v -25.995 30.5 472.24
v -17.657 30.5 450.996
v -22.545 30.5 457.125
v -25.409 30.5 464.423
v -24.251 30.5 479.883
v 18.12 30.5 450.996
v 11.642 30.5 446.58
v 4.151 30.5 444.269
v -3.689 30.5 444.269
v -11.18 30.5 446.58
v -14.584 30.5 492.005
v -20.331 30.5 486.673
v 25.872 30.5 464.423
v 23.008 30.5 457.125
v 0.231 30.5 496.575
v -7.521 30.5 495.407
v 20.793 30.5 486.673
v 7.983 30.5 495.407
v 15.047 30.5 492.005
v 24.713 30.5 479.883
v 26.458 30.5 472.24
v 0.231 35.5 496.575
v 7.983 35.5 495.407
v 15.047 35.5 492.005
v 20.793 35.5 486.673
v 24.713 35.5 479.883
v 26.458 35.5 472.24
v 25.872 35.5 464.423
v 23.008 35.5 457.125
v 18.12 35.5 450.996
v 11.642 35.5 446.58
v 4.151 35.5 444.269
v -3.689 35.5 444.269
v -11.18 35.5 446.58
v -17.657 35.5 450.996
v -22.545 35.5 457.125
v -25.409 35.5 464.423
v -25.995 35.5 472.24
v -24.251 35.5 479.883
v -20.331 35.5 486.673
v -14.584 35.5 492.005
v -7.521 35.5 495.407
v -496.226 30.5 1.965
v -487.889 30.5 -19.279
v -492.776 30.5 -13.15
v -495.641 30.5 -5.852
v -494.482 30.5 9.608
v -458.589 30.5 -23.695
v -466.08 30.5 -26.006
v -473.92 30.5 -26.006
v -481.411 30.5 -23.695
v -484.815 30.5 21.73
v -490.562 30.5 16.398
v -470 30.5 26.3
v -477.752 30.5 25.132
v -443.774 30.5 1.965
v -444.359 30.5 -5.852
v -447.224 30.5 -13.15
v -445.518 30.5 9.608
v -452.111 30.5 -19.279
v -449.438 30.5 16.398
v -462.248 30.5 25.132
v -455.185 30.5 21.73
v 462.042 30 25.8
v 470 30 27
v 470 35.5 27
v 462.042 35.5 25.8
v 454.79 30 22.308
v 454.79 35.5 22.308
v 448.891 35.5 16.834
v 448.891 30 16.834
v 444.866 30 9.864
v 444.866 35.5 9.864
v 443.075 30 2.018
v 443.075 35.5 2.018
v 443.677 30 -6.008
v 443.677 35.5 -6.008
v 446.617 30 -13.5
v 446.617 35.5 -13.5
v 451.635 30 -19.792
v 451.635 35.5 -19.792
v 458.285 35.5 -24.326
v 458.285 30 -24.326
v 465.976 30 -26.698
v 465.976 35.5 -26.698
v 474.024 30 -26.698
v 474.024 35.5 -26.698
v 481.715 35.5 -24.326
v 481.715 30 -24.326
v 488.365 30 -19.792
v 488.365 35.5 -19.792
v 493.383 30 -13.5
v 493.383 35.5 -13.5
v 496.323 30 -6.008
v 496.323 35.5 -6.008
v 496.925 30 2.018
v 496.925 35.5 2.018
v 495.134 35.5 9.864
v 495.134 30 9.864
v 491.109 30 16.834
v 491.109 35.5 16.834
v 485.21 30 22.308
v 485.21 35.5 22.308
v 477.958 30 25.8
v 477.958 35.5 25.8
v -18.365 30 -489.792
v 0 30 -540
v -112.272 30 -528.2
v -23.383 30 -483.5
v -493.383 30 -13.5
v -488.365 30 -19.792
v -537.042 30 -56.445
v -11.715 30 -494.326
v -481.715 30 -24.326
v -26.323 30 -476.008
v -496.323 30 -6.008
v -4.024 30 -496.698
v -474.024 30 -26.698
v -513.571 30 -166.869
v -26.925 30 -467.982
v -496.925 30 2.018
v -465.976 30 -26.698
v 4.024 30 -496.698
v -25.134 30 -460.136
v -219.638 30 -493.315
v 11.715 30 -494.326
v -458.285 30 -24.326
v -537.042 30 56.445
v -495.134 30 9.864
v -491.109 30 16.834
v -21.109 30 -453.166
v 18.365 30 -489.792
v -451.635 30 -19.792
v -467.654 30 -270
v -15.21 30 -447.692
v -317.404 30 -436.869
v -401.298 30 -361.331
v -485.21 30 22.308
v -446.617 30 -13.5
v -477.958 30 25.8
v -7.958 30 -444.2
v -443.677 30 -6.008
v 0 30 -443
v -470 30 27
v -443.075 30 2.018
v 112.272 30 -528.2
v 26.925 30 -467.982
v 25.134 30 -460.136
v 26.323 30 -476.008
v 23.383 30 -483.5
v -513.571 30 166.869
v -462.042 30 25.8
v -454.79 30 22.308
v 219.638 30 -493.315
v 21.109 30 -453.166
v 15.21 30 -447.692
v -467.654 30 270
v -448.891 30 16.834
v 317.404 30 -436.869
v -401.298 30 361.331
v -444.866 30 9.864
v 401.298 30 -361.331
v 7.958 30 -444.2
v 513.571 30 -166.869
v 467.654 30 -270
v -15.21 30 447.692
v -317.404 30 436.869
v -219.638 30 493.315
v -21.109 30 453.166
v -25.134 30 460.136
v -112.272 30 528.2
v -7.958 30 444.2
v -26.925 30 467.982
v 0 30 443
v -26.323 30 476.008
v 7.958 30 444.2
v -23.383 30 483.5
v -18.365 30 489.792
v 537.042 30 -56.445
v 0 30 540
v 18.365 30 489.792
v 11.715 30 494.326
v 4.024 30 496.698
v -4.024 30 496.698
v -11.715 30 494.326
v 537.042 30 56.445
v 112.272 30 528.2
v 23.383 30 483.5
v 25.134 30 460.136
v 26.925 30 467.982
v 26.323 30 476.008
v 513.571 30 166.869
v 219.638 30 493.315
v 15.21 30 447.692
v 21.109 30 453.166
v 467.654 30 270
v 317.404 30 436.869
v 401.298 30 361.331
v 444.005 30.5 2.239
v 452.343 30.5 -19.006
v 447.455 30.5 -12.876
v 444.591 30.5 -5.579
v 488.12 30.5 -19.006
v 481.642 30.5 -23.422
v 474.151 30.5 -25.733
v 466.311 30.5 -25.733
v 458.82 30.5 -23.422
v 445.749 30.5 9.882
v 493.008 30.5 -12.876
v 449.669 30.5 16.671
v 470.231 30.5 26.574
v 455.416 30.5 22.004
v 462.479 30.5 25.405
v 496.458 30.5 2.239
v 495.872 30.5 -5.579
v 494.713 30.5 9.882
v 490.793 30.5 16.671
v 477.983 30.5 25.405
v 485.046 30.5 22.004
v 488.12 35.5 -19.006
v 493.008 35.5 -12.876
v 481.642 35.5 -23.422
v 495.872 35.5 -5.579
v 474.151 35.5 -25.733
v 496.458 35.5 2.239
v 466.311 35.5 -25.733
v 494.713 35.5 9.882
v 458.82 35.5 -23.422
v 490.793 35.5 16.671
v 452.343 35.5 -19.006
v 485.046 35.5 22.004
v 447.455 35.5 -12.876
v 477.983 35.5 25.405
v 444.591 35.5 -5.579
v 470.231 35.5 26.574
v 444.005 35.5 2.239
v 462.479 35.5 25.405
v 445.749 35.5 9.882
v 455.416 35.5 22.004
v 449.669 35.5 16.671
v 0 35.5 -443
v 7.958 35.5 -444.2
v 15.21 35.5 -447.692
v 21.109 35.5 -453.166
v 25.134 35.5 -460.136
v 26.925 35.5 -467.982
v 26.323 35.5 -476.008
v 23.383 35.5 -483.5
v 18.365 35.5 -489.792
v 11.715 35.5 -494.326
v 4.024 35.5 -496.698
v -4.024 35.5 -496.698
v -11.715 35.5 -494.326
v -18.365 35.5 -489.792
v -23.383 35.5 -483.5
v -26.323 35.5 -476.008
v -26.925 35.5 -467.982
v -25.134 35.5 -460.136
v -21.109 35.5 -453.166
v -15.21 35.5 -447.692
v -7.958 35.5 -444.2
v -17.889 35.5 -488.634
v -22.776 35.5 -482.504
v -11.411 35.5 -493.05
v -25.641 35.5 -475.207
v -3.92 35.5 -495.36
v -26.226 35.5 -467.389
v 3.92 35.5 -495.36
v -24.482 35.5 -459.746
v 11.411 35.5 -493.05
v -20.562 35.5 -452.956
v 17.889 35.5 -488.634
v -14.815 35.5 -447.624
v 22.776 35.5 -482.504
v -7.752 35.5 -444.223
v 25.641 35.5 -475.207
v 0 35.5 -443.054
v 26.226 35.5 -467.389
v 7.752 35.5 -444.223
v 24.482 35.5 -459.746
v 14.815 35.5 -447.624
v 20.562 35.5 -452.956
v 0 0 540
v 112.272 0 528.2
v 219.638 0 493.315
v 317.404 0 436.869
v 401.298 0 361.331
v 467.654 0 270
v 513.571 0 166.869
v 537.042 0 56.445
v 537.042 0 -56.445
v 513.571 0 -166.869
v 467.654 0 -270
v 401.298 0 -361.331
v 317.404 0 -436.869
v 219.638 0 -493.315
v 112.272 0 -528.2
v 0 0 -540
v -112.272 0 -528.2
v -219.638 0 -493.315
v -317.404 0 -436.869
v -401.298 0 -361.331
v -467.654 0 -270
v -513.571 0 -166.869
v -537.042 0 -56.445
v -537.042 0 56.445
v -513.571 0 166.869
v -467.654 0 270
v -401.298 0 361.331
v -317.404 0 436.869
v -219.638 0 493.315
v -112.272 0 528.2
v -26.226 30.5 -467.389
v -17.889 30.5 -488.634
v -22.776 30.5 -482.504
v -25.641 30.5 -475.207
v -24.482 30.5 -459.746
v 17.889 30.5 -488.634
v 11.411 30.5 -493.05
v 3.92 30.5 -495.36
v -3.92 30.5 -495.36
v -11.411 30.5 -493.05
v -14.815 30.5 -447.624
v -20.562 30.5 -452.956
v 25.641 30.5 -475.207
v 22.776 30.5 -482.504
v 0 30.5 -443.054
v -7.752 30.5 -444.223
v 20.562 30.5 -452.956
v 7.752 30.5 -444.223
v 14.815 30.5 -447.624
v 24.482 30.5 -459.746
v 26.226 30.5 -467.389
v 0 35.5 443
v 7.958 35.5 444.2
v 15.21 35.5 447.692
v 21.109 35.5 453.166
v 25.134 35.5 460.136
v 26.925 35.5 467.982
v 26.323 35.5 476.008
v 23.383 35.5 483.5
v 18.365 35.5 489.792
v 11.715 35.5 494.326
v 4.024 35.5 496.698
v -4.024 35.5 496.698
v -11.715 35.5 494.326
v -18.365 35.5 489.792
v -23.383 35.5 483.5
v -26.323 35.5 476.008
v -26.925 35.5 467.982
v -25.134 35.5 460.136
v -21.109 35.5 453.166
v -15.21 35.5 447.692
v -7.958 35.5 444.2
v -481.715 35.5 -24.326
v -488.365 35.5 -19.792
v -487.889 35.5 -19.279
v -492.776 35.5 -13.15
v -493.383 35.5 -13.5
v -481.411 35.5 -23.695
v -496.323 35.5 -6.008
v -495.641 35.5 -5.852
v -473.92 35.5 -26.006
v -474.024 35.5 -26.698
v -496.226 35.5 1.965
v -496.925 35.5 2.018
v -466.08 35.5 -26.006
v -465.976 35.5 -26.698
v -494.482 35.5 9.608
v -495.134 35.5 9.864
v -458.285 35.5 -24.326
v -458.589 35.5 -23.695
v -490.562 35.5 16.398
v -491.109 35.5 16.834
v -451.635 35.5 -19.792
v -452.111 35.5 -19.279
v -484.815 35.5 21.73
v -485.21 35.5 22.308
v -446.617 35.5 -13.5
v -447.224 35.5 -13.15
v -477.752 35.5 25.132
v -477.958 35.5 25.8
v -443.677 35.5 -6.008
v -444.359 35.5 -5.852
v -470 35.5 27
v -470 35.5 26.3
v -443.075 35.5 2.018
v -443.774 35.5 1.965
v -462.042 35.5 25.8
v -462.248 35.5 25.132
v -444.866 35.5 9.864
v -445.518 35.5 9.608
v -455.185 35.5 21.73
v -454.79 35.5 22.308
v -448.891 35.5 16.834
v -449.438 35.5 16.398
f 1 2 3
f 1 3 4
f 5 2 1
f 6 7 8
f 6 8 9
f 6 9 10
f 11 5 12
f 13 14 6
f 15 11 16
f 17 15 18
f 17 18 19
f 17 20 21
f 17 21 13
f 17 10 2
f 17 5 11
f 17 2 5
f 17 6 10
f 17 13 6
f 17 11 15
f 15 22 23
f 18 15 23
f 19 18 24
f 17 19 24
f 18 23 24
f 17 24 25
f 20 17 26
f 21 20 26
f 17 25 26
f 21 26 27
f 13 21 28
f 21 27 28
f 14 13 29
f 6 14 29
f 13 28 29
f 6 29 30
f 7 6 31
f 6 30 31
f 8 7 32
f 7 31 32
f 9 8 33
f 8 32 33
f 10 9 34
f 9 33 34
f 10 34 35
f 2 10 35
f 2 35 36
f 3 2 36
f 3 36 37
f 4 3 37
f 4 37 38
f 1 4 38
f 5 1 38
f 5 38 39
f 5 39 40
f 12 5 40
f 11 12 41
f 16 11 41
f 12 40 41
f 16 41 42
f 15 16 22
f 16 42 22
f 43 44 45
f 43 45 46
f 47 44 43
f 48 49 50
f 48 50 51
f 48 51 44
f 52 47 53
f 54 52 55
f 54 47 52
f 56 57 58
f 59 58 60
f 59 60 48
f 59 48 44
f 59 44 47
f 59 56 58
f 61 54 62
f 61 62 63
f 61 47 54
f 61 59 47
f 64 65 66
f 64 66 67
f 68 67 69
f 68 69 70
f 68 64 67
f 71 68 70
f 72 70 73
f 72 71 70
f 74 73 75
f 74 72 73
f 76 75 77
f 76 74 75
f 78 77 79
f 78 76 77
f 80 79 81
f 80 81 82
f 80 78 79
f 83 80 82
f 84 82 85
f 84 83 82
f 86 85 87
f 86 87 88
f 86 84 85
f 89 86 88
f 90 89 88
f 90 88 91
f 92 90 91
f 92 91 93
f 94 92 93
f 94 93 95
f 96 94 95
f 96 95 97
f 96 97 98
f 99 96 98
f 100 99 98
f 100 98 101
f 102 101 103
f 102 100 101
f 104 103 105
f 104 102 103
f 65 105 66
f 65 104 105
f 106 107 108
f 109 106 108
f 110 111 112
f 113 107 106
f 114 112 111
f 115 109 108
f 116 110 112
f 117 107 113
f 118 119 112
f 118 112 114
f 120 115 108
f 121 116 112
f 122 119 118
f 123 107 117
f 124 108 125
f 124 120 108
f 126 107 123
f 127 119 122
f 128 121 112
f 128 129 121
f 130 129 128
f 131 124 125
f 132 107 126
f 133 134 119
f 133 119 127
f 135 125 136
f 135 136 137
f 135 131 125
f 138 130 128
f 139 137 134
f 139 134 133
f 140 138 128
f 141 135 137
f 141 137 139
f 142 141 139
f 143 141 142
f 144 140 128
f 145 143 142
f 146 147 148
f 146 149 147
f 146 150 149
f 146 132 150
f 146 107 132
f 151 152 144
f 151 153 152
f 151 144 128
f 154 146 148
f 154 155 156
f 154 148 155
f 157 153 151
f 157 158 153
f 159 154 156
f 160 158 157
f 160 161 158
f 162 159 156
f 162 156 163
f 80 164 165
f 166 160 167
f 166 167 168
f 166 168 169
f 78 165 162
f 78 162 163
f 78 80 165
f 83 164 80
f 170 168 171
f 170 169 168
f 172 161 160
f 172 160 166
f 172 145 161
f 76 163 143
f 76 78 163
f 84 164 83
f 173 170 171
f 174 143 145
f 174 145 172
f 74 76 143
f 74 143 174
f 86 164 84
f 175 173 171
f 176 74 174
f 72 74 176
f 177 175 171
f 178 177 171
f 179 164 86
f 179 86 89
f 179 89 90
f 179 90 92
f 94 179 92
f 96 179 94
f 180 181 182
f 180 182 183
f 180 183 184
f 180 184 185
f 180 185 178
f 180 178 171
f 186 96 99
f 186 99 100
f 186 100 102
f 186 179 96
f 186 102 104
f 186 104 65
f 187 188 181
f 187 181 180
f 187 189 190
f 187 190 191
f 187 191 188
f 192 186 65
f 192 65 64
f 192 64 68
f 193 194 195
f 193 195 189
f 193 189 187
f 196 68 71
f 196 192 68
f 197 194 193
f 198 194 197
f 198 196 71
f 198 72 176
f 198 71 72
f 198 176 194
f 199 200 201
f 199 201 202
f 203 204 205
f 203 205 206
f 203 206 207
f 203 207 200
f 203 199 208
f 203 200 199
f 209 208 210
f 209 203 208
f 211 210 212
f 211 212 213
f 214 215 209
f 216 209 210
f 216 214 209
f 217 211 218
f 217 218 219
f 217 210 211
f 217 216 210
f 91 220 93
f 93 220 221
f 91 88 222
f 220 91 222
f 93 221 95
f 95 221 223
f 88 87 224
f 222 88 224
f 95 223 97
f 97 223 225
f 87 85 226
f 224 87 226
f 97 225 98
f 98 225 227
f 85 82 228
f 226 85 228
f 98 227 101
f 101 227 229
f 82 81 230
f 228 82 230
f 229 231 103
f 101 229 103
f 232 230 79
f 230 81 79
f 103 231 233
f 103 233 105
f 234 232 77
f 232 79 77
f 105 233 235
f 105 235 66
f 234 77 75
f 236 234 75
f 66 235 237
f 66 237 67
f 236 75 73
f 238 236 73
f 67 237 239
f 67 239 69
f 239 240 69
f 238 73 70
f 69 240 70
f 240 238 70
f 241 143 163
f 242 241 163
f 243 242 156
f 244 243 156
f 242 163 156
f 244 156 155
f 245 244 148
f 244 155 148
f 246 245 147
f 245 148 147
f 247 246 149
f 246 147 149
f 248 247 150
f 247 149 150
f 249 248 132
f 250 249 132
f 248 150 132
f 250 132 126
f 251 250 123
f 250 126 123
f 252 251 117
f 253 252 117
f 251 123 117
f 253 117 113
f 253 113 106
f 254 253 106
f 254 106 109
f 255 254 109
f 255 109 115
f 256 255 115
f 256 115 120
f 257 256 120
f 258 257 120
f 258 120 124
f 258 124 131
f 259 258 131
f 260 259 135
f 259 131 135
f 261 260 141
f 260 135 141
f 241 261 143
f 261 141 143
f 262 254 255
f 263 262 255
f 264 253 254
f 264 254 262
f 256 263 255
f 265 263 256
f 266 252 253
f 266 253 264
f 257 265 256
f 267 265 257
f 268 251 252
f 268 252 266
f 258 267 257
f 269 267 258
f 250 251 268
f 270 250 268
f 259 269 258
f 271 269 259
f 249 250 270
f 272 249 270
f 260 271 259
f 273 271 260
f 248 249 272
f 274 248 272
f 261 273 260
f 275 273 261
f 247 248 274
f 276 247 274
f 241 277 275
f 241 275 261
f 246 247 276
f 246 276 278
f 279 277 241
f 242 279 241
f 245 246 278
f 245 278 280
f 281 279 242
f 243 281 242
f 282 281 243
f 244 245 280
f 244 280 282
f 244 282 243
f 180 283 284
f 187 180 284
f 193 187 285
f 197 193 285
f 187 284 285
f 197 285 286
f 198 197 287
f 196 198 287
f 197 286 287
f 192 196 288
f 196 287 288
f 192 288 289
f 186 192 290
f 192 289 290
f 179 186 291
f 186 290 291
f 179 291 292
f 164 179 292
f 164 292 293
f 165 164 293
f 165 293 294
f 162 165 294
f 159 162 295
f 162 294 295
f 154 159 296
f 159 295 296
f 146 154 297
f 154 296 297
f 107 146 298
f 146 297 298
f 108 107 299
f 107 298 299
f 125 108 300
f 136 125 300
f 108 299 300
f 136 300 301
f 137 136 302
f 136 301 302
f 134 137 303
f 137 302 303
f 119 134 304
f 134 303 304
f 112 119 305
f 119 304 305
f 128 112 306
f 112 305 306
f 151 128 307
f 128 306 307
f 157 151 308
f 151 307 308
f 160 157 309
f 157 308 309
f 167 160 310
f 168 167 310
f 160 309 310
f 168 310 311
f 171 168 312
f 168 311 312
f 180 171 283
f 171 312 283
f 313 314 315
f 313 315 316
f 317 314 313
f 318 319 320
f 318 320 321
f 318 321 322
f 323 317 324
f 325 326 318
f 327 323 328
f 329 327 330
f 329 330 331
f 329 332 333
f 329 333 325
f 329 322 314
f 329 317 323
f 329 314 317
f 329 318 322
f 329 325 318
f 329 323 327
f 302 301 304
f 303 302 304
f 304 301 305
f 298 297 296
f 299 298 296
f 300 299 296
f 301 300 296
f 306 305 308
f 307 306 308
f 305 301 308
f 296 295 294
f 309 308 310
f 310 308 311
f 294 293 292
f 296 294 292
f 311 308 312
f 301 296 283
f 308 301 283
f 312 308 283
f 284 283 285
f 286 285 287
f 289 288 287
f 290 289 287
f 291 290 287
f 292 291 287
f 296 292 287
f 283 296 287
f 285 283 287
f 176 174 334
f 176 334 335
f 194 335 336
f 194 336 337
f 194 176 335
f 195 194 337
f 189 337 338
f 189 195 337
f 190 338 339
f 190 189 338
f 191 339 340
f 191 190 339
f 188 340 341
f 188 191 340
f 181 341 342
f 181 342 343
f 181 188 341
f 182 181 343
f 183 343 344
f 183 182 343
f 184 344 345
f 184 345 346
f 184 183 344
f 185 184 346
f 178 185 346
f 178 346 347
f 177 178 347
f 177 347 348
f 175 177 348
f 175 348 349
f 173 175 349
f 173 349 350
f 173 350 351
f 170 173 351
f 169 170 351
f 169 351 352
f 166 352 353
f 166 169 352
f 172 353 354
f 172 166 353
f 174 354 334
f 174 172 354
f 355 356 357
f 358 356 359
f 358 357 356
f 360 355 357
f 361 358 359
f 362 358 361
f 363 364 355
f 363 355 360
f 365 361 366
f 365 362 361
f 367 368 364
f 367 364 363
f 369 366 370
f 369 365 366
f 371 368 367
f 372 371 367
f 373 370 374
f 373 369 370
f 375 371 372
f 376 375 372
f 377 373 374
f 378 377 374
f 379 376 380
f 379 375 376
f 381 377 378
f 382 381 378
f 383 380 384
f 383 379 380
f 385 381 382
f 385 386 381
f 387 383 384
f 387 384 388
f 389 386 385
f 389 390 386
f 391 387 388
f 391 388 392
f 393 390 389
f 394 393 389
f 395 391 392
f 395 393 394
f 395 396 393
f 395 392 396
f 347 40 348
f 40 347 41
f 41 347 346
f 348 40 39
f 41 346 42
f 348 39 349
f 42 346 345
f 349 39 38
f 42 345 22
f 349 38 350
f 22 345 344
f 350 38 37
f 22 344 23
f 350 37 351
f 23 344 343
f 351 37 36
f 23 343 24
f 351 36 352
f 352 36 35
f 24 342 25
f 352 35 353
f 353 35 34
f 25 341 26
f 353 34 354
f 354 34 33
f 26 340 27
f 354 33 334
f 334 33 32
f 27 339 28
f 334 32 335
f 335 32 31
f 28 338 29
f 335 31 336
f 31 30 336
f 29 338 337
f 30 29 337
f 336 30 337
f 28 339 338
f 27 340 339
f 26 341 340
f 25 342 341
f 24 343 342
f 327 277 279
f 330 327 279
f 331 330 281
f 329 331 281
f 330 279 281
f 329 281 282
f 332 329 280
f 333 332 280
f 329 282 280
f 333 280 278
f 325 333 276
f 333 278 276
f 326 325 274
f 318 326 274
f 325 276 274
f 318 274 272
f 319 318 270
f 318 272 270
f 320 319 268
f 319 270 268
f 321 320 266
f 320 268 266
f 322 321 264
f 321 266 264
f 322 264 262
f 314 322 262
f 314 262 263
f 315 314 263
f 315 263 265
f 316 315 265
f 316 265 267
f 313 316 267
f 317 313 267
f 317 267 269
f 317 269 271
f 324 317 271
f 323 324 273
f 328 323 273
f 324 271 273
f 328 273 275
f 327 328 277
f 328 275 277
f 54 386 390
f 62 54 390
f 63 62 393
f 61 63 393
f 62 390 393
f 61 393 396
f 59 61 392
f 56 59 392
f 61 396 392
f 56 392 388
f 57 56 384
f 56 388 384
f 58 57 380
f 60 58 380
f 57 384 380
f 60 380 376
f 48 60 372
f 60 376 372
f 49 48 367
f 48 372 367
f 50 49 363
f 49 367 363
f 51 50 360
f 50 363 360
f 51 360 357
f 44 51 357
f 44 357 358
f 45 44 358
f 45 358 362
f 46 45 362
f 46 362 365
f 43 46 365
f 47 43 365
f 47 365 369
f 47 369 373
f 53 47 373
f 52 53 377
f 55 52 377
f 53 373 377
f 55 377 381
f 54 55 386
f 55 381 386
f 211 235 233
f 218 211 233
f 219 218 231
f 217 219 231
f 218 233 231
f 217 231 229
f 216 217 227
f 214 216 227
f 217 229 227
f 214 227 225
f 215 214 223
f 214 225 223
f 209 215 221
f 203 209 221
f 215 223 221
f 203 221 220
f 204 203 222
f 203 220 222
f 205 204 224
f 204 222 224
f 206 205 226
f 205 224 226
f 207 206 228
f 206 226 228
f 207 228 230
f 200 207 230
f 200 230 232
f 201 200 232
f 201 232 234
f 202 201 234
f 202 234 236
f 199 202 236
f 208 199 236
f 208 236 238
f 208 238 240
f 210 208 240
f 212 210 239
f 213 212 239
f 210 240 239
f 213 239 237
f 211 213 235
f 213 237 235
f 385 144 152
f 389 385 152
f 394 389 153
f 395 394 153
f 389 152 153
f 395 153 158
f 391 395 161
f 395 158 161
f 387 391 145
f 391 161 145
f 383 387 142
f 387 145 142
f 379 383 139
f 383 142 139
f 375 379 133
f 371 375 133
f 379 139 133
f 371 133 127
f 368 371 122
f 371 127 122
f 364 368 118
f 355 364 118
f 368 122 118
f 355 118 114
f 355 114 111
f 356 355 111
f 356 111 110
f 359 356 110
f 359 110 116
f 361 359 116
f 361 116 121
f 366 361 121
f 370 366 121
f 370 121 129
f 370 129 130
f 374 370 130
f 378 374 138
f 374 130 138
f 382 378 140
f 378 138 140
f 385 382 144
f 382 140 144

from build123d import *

# Parameters (mm, degrees)
SKETCH1_R           = 540
BOSS_EXTRUDE1_DEPTH = 30
SKETCH7_R           = 27
BOSS_EXTRUDE2_DEPTH = 5.5
SKETCH10_R          = 26.3
CUT_EXTRUDE1_DEPTH  = 5
SKETCH11_R          = 27
BOSS_EXTRUDE3_DEPTH = 5.5
SKETCH12_R          = 26.3
CUT_EXTRUDE2_DEPTH  = 5
SKETCH13_R          = 26.3
CUT_EXTRUDE3_DEPTH  = 5
SKETCH14_R          = 26.3
CUT_EXTRUDE4_DEPTH  = 5


with BuildPart() as part:
    # Sketch1 → Boss-Extrude1 (new body)
    with BuildSketch(Plane(origin=(0, 0, 0), x_dir=(1, 0, 0), z_dir=(0, 1, 0))):
        with Locations(Location((0, 0, 0), (0, 0, 270))):
            Circle(SKETCH1_R)
    extrude(amount=BOSS_EXTRUDE1_DEPTH)

    # Sketch7 → Boss-Extrude2 (add)
    with BuildSketch(Plane(origin=(0, 30, 0), x_dir=(1, 0, 0), z_dir=(0, 1, 0))):
        with Locations(Location((-470, 0, 0), (0, 0, 270))):
            Circle(SKETCH7_R)
    boss_extrude2 = extrude(amount=BOSS_EXTRUDE2_DEPTH)

    # Sketch10 → Cut-Extrude1 (cut)
    with BuildSketch(Plane(origin=(0, 35.5, 0), x_dir=(1, 0, 0), z_dir=(0, 1, 0))):
        with Locations(Location((-470, 0, 0), (0, 0, 270))):
            Circle(SKETCH10_R)
    extrude(amount=-CUT_EXTRUDE1_DEPTH, mode=Mode.SUBTRACT)

    # Mirror1: Boss-Extrude2 across plane
    add(boss_extrude2.mirror(Plane(origin=(0, 0, 0), x_dir=(0, 0, 1), z_dir=(1, 0, 0))))

    # Sketch11 → Boss-Extrude3 (add)
    with BuildSketch(Plane(origin=(0, 30, 0), x_dir=(1, 0, 0), z_dir=(0, 1, 0))):
        with Locations(Location((0, 470, 0), (0, 0, 270))):
            Circle(SKETCH11_R)
    boss_extrude3 = extrude(amount=BOSS_EXTRUDE3_DEPTH)

    # Sketch12 → Cut-Extrude2 (cut)
    with BuildSketch(Plane(origin=(0, 35.5, 0), x_dir=(1, 0, 0), z_dir=(0, 1, 0))):
        with Locations(Location((0, 469.354248554, 0), (0, 0, 270))):
            Circle(SKETCH12_R)
    extrude(amount=-CUT_EXTRUDE2_DEPTH, mode=Mode.SUBTRACT)

    # Mirror2: Boss-Extrude3 across plane
    add(boss_extrude3.mirror(Plane.XY))

    # Sketch13 → Cut-Extrude3 (cut)
    with BuildSketch(Plane(origin=(0, 35.5, 0), x_dir=(1, 0, 0), z_dir=(0, 1, 0))):
        with Locations(Location((0.231268316, -470.275017284, 0), (0, 0, 270))):
            Circle(SKETCH13_R)
    extrude(amount=-CUT_EXTRUDE3_DEPTH, mode=Mode.SUBTRACT)

    # Sketch14 → Cut-Extrude4 (cut)
    with BuildSketch(Plane(origin=(0, 35.5, 0), x_dir=(1, 0, 0), z_dir=(0, 1, 0))):
        with Locations(Location((470.23112187, -0.273591473, 0), (0, 0, 270))):
            Circle(SKETCH14_R)
    extrude(amount=-CUT_EXTRUDE4_DEPTH, mode=Mode.SUBTRACT)


solid = part.part
